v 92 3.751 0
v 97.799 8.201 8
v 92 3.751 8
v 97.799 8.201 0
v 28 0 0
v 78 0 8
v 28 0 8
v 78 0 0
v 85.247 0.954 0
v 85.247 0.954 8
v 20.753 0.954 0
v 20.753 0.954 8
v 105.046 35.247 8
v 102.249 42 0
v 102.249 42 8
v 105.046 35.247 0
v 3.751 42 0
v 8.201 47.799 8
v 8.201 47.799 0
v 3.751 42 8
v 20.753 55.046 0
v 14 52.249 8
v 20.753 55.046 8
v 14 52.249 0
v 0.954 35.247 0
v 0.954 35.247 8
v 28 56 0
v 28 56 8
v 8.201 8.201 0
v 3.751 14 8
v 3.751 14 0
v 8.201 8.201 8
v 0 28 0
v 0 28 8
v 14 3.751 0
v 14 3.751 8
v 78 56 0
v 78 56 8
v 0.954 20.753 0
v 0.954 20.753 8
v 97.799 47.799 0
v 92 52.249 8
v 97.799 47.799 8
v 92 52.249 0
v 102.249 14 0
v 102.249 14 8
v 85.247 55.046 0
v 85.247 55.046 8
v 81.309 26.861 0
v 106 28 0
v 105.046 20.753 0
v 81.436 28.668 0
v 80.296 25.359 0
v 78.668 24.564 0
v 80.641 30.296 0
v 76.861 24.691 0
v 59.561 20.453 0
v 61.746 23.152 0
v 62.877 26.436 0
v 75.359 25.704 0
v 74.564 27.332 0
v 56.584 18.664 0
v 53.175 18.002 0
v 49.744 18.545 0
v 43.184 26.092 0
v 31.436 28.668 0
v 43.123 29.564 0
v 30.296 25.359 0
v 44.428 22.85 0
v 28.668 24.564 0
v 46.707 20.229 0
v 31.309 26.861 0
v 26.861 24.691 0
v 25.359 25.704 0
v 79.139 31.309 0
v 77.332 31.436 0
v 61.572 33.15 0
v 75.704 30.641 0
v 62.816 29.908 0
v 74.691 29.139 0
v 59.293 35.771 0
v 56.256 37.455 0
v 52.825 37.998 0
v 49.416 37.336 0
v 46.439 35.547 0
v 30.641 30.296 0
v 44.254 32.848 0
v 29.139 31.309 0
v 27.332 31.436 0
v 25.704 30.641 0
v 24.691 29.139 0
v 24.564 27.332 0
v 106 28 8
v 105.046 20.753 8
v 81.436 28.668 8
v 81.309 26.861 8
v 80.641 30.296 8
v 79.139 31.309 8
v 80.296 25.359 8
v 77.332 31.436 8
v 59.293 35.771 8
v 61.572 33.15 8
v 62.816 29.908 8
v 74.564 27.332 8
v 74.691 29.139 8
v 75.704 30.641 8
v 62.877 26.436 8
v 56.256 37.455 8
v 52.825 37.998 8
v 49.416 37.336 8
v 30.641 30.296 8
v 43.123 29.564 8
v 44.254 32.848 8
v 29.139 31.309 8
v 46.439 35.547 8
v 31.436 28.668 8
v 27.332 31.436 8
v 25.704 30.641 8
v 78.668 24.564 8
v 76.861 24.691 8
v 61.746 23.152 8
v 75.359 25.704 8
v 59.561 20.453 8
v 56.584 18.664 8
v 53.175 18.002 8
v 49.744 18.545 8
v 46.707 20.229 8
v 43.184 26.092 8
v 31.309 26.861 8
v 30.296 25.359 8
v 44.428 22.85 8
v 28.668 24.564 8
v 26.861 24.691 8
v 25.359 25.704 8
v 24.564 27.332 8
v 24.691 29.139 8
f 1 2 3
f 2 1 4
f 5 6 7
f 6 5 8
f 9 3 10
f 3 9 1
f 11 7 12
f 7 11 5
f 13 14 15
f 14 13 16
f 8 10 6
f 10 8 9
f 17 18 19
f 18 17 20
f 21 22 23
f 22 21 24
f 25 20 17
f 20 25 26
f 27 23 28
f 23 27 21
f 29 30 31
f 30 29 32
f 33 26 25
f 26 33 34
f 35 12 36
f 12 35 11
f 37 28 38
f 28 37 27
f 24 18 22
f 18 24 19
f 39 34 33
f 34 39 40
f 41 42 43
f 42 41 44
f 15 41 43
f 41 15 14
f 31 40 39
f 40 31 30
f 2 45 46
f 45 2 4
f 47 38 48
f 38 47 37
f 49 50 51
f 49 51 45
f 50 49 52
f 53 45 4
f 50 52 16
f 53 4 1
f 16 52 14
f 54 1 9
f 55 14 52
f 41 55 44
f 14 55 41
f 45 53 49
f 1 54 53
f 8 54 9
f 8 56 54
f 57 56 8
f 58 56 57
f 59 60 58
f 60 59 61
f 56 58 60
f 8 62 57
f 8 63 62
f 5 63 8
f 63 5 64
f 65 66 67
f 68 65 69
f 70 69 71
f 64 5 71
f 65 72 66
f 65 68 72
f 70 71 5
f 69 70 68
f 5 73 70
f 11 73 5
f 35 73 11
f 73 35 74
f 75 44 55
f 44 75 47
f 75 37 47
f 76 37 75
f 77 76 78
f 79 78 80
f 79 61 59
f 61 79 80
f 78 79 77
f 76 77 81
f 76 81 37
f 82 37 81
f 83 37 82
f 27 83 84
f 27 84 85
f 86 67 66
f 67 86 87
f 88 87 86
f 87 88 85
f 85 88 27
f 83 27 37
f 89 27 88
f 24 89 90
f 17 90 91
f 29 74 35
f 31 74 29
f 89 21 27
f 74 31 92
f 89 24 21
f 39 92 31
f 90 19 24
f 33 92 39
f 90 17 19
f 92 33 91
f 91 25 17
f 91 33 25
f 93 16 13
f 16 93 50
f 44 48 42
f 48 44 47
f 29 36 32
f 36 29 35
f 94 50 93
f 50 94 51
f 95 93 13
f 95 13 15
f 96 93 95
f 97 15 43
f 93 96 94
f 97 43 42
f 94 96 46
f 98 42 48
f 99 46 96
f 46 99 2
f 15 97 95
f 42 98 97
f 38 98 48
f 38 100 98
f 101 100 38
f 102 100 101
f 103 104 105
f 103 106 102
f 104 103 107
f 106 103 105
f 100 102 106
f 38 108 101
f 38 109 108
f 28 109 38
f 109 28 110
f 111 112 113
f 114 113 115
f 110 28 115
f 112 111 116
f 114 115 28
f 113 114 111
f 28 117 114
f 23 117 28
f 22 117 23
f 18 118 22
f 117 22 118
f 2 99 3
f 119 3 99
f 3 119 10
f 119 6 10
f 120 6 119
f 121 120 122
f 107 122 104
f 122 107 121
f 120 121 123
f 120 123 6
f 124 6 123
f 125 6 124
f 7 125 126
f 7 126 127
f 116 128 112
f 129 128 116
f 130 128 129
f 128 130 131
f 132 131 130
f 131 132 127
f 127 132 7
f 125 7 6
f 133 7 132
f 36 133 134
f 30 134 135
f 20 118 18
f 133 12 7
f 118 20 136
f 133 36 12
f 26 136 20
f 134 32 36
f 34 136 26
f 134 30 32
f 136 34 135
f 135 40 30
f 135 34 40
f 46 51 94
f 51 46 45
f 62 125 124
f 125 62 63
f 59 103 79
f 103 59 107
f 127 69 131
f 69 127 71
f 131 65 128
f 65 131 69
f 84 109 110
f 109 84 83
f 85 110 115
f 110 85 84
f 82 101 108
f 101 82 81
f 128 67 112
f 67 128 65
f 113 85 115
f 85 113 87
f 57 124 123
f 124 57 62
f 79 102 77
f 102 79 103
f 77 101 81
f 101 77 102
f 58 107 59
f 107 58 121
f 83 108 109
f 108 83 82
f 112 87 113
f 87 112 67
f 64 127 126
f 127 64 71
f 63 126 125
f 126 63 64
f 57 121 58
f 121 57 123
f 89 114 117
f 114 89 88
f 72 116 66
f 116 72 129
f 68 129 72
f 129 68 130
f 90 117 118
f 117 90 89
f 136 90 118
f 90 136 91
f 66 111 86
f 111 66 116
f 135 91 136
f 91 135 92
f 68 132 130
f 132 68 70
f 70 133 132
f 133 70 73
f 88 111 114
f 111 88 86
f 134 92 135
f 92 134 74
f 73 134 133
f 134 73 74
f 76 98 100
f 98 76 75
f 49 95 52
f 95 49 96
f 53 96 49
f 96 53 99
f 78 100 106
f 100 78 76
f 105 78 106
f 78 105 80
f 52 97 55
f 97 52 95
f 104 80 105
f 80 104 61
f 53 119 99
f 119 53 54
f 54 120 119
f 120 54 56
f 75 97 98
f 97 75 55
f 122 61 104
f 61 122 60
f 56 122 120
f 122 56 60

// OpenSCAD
$fn = 32;

// ----------------------------------------------------------------------
// Spacer plate: obround span 50, caps R28
// ----------------------------------------------------------------------

// --- parameters (mm) ---
bore_r = 10;              // centre bore radius
bolt_r = 3.5;             // bolt hole radius
plate_t = 8;              // plate thickness, Z (extrusion height)
span = 50;                // obround span
cap_r = 28;               // cap radius

profile = [[28, 56], [20.753, 55.046], [14, 52.249], [8.201, 47.799], [3.751, 42], [0.954, 35.247], [0, 28], [0.954, 20.753], [3.751, 14], [8.201, 8.201], [14, 3.751], [20.753, 0.954], [28, 0], [78, 0], [85.247, 0.954], [92, 3.751], [97.799, 8.201], [102.249, 14], [105.046, 20.753], [106, 28], [105.046, 35.247], [102.249, 42], [97.799, 47.799], [92, 52.249], [85.247, 55.046], [78, 56]];  // primary outline, 26 points, counter clockwise
void_1 = [[62.816, 29.908], [61.572, 33.15], [59.293, 35.771], [56.256, 37.455], [52.825, 37.998], [49.416, 37.336], [46.439, 35.547], [44.254, 32.848], [43.123, 29.564], [43.184, 26.092], [44.428, 22.85], [46.707, 20.229], [49.744, 18.545], [53.175, 18.002], [56.584, 18.664], [59.561, 20.453], [61.746, 23.152], [62.877, 26.436]];  // centre bore, 18 points
void_2 = [[31.436, 28.668], [30.641, 30.296], [29.139, 31.309], [27.332, 31.436], [25.704, 30.641], [24.691, 29.139], [24.564, 27.332], [25.359, 25.704], [26.861, 24.691], [28.668, 24.564], [30.296, 25.359], [31.309, 26.861]];  // end hole, 12 points
void_3 = [[81.436, 28.668], [80.641, 30.296], [79.139, 31.309], [77.332, 31.436], [75.704, 30.641], [74.691, 29.139], [74.564, 27.332], [75.359, 25.704], [76.861, 24.691], [78.668, 24.564], [80.296, 25.359], [81.309, 26.861]];  // end hole, 12 points

// --- the one profile operation ---
difference() {
  linear_extrude(height = plate_t) polygon(points = profile);
  translate([0, 0, -1])
    linear_extrude(height = plate_t + 2) polygon(points = void_1);
  translate([0, 0, -1])
    linear_extrude(height = plate_t + 2) polygon(points = void_2);
  translate([0, 0, -1])
    linear_extrude(height = plate_t + 2) polygon(points = void_3);
}
